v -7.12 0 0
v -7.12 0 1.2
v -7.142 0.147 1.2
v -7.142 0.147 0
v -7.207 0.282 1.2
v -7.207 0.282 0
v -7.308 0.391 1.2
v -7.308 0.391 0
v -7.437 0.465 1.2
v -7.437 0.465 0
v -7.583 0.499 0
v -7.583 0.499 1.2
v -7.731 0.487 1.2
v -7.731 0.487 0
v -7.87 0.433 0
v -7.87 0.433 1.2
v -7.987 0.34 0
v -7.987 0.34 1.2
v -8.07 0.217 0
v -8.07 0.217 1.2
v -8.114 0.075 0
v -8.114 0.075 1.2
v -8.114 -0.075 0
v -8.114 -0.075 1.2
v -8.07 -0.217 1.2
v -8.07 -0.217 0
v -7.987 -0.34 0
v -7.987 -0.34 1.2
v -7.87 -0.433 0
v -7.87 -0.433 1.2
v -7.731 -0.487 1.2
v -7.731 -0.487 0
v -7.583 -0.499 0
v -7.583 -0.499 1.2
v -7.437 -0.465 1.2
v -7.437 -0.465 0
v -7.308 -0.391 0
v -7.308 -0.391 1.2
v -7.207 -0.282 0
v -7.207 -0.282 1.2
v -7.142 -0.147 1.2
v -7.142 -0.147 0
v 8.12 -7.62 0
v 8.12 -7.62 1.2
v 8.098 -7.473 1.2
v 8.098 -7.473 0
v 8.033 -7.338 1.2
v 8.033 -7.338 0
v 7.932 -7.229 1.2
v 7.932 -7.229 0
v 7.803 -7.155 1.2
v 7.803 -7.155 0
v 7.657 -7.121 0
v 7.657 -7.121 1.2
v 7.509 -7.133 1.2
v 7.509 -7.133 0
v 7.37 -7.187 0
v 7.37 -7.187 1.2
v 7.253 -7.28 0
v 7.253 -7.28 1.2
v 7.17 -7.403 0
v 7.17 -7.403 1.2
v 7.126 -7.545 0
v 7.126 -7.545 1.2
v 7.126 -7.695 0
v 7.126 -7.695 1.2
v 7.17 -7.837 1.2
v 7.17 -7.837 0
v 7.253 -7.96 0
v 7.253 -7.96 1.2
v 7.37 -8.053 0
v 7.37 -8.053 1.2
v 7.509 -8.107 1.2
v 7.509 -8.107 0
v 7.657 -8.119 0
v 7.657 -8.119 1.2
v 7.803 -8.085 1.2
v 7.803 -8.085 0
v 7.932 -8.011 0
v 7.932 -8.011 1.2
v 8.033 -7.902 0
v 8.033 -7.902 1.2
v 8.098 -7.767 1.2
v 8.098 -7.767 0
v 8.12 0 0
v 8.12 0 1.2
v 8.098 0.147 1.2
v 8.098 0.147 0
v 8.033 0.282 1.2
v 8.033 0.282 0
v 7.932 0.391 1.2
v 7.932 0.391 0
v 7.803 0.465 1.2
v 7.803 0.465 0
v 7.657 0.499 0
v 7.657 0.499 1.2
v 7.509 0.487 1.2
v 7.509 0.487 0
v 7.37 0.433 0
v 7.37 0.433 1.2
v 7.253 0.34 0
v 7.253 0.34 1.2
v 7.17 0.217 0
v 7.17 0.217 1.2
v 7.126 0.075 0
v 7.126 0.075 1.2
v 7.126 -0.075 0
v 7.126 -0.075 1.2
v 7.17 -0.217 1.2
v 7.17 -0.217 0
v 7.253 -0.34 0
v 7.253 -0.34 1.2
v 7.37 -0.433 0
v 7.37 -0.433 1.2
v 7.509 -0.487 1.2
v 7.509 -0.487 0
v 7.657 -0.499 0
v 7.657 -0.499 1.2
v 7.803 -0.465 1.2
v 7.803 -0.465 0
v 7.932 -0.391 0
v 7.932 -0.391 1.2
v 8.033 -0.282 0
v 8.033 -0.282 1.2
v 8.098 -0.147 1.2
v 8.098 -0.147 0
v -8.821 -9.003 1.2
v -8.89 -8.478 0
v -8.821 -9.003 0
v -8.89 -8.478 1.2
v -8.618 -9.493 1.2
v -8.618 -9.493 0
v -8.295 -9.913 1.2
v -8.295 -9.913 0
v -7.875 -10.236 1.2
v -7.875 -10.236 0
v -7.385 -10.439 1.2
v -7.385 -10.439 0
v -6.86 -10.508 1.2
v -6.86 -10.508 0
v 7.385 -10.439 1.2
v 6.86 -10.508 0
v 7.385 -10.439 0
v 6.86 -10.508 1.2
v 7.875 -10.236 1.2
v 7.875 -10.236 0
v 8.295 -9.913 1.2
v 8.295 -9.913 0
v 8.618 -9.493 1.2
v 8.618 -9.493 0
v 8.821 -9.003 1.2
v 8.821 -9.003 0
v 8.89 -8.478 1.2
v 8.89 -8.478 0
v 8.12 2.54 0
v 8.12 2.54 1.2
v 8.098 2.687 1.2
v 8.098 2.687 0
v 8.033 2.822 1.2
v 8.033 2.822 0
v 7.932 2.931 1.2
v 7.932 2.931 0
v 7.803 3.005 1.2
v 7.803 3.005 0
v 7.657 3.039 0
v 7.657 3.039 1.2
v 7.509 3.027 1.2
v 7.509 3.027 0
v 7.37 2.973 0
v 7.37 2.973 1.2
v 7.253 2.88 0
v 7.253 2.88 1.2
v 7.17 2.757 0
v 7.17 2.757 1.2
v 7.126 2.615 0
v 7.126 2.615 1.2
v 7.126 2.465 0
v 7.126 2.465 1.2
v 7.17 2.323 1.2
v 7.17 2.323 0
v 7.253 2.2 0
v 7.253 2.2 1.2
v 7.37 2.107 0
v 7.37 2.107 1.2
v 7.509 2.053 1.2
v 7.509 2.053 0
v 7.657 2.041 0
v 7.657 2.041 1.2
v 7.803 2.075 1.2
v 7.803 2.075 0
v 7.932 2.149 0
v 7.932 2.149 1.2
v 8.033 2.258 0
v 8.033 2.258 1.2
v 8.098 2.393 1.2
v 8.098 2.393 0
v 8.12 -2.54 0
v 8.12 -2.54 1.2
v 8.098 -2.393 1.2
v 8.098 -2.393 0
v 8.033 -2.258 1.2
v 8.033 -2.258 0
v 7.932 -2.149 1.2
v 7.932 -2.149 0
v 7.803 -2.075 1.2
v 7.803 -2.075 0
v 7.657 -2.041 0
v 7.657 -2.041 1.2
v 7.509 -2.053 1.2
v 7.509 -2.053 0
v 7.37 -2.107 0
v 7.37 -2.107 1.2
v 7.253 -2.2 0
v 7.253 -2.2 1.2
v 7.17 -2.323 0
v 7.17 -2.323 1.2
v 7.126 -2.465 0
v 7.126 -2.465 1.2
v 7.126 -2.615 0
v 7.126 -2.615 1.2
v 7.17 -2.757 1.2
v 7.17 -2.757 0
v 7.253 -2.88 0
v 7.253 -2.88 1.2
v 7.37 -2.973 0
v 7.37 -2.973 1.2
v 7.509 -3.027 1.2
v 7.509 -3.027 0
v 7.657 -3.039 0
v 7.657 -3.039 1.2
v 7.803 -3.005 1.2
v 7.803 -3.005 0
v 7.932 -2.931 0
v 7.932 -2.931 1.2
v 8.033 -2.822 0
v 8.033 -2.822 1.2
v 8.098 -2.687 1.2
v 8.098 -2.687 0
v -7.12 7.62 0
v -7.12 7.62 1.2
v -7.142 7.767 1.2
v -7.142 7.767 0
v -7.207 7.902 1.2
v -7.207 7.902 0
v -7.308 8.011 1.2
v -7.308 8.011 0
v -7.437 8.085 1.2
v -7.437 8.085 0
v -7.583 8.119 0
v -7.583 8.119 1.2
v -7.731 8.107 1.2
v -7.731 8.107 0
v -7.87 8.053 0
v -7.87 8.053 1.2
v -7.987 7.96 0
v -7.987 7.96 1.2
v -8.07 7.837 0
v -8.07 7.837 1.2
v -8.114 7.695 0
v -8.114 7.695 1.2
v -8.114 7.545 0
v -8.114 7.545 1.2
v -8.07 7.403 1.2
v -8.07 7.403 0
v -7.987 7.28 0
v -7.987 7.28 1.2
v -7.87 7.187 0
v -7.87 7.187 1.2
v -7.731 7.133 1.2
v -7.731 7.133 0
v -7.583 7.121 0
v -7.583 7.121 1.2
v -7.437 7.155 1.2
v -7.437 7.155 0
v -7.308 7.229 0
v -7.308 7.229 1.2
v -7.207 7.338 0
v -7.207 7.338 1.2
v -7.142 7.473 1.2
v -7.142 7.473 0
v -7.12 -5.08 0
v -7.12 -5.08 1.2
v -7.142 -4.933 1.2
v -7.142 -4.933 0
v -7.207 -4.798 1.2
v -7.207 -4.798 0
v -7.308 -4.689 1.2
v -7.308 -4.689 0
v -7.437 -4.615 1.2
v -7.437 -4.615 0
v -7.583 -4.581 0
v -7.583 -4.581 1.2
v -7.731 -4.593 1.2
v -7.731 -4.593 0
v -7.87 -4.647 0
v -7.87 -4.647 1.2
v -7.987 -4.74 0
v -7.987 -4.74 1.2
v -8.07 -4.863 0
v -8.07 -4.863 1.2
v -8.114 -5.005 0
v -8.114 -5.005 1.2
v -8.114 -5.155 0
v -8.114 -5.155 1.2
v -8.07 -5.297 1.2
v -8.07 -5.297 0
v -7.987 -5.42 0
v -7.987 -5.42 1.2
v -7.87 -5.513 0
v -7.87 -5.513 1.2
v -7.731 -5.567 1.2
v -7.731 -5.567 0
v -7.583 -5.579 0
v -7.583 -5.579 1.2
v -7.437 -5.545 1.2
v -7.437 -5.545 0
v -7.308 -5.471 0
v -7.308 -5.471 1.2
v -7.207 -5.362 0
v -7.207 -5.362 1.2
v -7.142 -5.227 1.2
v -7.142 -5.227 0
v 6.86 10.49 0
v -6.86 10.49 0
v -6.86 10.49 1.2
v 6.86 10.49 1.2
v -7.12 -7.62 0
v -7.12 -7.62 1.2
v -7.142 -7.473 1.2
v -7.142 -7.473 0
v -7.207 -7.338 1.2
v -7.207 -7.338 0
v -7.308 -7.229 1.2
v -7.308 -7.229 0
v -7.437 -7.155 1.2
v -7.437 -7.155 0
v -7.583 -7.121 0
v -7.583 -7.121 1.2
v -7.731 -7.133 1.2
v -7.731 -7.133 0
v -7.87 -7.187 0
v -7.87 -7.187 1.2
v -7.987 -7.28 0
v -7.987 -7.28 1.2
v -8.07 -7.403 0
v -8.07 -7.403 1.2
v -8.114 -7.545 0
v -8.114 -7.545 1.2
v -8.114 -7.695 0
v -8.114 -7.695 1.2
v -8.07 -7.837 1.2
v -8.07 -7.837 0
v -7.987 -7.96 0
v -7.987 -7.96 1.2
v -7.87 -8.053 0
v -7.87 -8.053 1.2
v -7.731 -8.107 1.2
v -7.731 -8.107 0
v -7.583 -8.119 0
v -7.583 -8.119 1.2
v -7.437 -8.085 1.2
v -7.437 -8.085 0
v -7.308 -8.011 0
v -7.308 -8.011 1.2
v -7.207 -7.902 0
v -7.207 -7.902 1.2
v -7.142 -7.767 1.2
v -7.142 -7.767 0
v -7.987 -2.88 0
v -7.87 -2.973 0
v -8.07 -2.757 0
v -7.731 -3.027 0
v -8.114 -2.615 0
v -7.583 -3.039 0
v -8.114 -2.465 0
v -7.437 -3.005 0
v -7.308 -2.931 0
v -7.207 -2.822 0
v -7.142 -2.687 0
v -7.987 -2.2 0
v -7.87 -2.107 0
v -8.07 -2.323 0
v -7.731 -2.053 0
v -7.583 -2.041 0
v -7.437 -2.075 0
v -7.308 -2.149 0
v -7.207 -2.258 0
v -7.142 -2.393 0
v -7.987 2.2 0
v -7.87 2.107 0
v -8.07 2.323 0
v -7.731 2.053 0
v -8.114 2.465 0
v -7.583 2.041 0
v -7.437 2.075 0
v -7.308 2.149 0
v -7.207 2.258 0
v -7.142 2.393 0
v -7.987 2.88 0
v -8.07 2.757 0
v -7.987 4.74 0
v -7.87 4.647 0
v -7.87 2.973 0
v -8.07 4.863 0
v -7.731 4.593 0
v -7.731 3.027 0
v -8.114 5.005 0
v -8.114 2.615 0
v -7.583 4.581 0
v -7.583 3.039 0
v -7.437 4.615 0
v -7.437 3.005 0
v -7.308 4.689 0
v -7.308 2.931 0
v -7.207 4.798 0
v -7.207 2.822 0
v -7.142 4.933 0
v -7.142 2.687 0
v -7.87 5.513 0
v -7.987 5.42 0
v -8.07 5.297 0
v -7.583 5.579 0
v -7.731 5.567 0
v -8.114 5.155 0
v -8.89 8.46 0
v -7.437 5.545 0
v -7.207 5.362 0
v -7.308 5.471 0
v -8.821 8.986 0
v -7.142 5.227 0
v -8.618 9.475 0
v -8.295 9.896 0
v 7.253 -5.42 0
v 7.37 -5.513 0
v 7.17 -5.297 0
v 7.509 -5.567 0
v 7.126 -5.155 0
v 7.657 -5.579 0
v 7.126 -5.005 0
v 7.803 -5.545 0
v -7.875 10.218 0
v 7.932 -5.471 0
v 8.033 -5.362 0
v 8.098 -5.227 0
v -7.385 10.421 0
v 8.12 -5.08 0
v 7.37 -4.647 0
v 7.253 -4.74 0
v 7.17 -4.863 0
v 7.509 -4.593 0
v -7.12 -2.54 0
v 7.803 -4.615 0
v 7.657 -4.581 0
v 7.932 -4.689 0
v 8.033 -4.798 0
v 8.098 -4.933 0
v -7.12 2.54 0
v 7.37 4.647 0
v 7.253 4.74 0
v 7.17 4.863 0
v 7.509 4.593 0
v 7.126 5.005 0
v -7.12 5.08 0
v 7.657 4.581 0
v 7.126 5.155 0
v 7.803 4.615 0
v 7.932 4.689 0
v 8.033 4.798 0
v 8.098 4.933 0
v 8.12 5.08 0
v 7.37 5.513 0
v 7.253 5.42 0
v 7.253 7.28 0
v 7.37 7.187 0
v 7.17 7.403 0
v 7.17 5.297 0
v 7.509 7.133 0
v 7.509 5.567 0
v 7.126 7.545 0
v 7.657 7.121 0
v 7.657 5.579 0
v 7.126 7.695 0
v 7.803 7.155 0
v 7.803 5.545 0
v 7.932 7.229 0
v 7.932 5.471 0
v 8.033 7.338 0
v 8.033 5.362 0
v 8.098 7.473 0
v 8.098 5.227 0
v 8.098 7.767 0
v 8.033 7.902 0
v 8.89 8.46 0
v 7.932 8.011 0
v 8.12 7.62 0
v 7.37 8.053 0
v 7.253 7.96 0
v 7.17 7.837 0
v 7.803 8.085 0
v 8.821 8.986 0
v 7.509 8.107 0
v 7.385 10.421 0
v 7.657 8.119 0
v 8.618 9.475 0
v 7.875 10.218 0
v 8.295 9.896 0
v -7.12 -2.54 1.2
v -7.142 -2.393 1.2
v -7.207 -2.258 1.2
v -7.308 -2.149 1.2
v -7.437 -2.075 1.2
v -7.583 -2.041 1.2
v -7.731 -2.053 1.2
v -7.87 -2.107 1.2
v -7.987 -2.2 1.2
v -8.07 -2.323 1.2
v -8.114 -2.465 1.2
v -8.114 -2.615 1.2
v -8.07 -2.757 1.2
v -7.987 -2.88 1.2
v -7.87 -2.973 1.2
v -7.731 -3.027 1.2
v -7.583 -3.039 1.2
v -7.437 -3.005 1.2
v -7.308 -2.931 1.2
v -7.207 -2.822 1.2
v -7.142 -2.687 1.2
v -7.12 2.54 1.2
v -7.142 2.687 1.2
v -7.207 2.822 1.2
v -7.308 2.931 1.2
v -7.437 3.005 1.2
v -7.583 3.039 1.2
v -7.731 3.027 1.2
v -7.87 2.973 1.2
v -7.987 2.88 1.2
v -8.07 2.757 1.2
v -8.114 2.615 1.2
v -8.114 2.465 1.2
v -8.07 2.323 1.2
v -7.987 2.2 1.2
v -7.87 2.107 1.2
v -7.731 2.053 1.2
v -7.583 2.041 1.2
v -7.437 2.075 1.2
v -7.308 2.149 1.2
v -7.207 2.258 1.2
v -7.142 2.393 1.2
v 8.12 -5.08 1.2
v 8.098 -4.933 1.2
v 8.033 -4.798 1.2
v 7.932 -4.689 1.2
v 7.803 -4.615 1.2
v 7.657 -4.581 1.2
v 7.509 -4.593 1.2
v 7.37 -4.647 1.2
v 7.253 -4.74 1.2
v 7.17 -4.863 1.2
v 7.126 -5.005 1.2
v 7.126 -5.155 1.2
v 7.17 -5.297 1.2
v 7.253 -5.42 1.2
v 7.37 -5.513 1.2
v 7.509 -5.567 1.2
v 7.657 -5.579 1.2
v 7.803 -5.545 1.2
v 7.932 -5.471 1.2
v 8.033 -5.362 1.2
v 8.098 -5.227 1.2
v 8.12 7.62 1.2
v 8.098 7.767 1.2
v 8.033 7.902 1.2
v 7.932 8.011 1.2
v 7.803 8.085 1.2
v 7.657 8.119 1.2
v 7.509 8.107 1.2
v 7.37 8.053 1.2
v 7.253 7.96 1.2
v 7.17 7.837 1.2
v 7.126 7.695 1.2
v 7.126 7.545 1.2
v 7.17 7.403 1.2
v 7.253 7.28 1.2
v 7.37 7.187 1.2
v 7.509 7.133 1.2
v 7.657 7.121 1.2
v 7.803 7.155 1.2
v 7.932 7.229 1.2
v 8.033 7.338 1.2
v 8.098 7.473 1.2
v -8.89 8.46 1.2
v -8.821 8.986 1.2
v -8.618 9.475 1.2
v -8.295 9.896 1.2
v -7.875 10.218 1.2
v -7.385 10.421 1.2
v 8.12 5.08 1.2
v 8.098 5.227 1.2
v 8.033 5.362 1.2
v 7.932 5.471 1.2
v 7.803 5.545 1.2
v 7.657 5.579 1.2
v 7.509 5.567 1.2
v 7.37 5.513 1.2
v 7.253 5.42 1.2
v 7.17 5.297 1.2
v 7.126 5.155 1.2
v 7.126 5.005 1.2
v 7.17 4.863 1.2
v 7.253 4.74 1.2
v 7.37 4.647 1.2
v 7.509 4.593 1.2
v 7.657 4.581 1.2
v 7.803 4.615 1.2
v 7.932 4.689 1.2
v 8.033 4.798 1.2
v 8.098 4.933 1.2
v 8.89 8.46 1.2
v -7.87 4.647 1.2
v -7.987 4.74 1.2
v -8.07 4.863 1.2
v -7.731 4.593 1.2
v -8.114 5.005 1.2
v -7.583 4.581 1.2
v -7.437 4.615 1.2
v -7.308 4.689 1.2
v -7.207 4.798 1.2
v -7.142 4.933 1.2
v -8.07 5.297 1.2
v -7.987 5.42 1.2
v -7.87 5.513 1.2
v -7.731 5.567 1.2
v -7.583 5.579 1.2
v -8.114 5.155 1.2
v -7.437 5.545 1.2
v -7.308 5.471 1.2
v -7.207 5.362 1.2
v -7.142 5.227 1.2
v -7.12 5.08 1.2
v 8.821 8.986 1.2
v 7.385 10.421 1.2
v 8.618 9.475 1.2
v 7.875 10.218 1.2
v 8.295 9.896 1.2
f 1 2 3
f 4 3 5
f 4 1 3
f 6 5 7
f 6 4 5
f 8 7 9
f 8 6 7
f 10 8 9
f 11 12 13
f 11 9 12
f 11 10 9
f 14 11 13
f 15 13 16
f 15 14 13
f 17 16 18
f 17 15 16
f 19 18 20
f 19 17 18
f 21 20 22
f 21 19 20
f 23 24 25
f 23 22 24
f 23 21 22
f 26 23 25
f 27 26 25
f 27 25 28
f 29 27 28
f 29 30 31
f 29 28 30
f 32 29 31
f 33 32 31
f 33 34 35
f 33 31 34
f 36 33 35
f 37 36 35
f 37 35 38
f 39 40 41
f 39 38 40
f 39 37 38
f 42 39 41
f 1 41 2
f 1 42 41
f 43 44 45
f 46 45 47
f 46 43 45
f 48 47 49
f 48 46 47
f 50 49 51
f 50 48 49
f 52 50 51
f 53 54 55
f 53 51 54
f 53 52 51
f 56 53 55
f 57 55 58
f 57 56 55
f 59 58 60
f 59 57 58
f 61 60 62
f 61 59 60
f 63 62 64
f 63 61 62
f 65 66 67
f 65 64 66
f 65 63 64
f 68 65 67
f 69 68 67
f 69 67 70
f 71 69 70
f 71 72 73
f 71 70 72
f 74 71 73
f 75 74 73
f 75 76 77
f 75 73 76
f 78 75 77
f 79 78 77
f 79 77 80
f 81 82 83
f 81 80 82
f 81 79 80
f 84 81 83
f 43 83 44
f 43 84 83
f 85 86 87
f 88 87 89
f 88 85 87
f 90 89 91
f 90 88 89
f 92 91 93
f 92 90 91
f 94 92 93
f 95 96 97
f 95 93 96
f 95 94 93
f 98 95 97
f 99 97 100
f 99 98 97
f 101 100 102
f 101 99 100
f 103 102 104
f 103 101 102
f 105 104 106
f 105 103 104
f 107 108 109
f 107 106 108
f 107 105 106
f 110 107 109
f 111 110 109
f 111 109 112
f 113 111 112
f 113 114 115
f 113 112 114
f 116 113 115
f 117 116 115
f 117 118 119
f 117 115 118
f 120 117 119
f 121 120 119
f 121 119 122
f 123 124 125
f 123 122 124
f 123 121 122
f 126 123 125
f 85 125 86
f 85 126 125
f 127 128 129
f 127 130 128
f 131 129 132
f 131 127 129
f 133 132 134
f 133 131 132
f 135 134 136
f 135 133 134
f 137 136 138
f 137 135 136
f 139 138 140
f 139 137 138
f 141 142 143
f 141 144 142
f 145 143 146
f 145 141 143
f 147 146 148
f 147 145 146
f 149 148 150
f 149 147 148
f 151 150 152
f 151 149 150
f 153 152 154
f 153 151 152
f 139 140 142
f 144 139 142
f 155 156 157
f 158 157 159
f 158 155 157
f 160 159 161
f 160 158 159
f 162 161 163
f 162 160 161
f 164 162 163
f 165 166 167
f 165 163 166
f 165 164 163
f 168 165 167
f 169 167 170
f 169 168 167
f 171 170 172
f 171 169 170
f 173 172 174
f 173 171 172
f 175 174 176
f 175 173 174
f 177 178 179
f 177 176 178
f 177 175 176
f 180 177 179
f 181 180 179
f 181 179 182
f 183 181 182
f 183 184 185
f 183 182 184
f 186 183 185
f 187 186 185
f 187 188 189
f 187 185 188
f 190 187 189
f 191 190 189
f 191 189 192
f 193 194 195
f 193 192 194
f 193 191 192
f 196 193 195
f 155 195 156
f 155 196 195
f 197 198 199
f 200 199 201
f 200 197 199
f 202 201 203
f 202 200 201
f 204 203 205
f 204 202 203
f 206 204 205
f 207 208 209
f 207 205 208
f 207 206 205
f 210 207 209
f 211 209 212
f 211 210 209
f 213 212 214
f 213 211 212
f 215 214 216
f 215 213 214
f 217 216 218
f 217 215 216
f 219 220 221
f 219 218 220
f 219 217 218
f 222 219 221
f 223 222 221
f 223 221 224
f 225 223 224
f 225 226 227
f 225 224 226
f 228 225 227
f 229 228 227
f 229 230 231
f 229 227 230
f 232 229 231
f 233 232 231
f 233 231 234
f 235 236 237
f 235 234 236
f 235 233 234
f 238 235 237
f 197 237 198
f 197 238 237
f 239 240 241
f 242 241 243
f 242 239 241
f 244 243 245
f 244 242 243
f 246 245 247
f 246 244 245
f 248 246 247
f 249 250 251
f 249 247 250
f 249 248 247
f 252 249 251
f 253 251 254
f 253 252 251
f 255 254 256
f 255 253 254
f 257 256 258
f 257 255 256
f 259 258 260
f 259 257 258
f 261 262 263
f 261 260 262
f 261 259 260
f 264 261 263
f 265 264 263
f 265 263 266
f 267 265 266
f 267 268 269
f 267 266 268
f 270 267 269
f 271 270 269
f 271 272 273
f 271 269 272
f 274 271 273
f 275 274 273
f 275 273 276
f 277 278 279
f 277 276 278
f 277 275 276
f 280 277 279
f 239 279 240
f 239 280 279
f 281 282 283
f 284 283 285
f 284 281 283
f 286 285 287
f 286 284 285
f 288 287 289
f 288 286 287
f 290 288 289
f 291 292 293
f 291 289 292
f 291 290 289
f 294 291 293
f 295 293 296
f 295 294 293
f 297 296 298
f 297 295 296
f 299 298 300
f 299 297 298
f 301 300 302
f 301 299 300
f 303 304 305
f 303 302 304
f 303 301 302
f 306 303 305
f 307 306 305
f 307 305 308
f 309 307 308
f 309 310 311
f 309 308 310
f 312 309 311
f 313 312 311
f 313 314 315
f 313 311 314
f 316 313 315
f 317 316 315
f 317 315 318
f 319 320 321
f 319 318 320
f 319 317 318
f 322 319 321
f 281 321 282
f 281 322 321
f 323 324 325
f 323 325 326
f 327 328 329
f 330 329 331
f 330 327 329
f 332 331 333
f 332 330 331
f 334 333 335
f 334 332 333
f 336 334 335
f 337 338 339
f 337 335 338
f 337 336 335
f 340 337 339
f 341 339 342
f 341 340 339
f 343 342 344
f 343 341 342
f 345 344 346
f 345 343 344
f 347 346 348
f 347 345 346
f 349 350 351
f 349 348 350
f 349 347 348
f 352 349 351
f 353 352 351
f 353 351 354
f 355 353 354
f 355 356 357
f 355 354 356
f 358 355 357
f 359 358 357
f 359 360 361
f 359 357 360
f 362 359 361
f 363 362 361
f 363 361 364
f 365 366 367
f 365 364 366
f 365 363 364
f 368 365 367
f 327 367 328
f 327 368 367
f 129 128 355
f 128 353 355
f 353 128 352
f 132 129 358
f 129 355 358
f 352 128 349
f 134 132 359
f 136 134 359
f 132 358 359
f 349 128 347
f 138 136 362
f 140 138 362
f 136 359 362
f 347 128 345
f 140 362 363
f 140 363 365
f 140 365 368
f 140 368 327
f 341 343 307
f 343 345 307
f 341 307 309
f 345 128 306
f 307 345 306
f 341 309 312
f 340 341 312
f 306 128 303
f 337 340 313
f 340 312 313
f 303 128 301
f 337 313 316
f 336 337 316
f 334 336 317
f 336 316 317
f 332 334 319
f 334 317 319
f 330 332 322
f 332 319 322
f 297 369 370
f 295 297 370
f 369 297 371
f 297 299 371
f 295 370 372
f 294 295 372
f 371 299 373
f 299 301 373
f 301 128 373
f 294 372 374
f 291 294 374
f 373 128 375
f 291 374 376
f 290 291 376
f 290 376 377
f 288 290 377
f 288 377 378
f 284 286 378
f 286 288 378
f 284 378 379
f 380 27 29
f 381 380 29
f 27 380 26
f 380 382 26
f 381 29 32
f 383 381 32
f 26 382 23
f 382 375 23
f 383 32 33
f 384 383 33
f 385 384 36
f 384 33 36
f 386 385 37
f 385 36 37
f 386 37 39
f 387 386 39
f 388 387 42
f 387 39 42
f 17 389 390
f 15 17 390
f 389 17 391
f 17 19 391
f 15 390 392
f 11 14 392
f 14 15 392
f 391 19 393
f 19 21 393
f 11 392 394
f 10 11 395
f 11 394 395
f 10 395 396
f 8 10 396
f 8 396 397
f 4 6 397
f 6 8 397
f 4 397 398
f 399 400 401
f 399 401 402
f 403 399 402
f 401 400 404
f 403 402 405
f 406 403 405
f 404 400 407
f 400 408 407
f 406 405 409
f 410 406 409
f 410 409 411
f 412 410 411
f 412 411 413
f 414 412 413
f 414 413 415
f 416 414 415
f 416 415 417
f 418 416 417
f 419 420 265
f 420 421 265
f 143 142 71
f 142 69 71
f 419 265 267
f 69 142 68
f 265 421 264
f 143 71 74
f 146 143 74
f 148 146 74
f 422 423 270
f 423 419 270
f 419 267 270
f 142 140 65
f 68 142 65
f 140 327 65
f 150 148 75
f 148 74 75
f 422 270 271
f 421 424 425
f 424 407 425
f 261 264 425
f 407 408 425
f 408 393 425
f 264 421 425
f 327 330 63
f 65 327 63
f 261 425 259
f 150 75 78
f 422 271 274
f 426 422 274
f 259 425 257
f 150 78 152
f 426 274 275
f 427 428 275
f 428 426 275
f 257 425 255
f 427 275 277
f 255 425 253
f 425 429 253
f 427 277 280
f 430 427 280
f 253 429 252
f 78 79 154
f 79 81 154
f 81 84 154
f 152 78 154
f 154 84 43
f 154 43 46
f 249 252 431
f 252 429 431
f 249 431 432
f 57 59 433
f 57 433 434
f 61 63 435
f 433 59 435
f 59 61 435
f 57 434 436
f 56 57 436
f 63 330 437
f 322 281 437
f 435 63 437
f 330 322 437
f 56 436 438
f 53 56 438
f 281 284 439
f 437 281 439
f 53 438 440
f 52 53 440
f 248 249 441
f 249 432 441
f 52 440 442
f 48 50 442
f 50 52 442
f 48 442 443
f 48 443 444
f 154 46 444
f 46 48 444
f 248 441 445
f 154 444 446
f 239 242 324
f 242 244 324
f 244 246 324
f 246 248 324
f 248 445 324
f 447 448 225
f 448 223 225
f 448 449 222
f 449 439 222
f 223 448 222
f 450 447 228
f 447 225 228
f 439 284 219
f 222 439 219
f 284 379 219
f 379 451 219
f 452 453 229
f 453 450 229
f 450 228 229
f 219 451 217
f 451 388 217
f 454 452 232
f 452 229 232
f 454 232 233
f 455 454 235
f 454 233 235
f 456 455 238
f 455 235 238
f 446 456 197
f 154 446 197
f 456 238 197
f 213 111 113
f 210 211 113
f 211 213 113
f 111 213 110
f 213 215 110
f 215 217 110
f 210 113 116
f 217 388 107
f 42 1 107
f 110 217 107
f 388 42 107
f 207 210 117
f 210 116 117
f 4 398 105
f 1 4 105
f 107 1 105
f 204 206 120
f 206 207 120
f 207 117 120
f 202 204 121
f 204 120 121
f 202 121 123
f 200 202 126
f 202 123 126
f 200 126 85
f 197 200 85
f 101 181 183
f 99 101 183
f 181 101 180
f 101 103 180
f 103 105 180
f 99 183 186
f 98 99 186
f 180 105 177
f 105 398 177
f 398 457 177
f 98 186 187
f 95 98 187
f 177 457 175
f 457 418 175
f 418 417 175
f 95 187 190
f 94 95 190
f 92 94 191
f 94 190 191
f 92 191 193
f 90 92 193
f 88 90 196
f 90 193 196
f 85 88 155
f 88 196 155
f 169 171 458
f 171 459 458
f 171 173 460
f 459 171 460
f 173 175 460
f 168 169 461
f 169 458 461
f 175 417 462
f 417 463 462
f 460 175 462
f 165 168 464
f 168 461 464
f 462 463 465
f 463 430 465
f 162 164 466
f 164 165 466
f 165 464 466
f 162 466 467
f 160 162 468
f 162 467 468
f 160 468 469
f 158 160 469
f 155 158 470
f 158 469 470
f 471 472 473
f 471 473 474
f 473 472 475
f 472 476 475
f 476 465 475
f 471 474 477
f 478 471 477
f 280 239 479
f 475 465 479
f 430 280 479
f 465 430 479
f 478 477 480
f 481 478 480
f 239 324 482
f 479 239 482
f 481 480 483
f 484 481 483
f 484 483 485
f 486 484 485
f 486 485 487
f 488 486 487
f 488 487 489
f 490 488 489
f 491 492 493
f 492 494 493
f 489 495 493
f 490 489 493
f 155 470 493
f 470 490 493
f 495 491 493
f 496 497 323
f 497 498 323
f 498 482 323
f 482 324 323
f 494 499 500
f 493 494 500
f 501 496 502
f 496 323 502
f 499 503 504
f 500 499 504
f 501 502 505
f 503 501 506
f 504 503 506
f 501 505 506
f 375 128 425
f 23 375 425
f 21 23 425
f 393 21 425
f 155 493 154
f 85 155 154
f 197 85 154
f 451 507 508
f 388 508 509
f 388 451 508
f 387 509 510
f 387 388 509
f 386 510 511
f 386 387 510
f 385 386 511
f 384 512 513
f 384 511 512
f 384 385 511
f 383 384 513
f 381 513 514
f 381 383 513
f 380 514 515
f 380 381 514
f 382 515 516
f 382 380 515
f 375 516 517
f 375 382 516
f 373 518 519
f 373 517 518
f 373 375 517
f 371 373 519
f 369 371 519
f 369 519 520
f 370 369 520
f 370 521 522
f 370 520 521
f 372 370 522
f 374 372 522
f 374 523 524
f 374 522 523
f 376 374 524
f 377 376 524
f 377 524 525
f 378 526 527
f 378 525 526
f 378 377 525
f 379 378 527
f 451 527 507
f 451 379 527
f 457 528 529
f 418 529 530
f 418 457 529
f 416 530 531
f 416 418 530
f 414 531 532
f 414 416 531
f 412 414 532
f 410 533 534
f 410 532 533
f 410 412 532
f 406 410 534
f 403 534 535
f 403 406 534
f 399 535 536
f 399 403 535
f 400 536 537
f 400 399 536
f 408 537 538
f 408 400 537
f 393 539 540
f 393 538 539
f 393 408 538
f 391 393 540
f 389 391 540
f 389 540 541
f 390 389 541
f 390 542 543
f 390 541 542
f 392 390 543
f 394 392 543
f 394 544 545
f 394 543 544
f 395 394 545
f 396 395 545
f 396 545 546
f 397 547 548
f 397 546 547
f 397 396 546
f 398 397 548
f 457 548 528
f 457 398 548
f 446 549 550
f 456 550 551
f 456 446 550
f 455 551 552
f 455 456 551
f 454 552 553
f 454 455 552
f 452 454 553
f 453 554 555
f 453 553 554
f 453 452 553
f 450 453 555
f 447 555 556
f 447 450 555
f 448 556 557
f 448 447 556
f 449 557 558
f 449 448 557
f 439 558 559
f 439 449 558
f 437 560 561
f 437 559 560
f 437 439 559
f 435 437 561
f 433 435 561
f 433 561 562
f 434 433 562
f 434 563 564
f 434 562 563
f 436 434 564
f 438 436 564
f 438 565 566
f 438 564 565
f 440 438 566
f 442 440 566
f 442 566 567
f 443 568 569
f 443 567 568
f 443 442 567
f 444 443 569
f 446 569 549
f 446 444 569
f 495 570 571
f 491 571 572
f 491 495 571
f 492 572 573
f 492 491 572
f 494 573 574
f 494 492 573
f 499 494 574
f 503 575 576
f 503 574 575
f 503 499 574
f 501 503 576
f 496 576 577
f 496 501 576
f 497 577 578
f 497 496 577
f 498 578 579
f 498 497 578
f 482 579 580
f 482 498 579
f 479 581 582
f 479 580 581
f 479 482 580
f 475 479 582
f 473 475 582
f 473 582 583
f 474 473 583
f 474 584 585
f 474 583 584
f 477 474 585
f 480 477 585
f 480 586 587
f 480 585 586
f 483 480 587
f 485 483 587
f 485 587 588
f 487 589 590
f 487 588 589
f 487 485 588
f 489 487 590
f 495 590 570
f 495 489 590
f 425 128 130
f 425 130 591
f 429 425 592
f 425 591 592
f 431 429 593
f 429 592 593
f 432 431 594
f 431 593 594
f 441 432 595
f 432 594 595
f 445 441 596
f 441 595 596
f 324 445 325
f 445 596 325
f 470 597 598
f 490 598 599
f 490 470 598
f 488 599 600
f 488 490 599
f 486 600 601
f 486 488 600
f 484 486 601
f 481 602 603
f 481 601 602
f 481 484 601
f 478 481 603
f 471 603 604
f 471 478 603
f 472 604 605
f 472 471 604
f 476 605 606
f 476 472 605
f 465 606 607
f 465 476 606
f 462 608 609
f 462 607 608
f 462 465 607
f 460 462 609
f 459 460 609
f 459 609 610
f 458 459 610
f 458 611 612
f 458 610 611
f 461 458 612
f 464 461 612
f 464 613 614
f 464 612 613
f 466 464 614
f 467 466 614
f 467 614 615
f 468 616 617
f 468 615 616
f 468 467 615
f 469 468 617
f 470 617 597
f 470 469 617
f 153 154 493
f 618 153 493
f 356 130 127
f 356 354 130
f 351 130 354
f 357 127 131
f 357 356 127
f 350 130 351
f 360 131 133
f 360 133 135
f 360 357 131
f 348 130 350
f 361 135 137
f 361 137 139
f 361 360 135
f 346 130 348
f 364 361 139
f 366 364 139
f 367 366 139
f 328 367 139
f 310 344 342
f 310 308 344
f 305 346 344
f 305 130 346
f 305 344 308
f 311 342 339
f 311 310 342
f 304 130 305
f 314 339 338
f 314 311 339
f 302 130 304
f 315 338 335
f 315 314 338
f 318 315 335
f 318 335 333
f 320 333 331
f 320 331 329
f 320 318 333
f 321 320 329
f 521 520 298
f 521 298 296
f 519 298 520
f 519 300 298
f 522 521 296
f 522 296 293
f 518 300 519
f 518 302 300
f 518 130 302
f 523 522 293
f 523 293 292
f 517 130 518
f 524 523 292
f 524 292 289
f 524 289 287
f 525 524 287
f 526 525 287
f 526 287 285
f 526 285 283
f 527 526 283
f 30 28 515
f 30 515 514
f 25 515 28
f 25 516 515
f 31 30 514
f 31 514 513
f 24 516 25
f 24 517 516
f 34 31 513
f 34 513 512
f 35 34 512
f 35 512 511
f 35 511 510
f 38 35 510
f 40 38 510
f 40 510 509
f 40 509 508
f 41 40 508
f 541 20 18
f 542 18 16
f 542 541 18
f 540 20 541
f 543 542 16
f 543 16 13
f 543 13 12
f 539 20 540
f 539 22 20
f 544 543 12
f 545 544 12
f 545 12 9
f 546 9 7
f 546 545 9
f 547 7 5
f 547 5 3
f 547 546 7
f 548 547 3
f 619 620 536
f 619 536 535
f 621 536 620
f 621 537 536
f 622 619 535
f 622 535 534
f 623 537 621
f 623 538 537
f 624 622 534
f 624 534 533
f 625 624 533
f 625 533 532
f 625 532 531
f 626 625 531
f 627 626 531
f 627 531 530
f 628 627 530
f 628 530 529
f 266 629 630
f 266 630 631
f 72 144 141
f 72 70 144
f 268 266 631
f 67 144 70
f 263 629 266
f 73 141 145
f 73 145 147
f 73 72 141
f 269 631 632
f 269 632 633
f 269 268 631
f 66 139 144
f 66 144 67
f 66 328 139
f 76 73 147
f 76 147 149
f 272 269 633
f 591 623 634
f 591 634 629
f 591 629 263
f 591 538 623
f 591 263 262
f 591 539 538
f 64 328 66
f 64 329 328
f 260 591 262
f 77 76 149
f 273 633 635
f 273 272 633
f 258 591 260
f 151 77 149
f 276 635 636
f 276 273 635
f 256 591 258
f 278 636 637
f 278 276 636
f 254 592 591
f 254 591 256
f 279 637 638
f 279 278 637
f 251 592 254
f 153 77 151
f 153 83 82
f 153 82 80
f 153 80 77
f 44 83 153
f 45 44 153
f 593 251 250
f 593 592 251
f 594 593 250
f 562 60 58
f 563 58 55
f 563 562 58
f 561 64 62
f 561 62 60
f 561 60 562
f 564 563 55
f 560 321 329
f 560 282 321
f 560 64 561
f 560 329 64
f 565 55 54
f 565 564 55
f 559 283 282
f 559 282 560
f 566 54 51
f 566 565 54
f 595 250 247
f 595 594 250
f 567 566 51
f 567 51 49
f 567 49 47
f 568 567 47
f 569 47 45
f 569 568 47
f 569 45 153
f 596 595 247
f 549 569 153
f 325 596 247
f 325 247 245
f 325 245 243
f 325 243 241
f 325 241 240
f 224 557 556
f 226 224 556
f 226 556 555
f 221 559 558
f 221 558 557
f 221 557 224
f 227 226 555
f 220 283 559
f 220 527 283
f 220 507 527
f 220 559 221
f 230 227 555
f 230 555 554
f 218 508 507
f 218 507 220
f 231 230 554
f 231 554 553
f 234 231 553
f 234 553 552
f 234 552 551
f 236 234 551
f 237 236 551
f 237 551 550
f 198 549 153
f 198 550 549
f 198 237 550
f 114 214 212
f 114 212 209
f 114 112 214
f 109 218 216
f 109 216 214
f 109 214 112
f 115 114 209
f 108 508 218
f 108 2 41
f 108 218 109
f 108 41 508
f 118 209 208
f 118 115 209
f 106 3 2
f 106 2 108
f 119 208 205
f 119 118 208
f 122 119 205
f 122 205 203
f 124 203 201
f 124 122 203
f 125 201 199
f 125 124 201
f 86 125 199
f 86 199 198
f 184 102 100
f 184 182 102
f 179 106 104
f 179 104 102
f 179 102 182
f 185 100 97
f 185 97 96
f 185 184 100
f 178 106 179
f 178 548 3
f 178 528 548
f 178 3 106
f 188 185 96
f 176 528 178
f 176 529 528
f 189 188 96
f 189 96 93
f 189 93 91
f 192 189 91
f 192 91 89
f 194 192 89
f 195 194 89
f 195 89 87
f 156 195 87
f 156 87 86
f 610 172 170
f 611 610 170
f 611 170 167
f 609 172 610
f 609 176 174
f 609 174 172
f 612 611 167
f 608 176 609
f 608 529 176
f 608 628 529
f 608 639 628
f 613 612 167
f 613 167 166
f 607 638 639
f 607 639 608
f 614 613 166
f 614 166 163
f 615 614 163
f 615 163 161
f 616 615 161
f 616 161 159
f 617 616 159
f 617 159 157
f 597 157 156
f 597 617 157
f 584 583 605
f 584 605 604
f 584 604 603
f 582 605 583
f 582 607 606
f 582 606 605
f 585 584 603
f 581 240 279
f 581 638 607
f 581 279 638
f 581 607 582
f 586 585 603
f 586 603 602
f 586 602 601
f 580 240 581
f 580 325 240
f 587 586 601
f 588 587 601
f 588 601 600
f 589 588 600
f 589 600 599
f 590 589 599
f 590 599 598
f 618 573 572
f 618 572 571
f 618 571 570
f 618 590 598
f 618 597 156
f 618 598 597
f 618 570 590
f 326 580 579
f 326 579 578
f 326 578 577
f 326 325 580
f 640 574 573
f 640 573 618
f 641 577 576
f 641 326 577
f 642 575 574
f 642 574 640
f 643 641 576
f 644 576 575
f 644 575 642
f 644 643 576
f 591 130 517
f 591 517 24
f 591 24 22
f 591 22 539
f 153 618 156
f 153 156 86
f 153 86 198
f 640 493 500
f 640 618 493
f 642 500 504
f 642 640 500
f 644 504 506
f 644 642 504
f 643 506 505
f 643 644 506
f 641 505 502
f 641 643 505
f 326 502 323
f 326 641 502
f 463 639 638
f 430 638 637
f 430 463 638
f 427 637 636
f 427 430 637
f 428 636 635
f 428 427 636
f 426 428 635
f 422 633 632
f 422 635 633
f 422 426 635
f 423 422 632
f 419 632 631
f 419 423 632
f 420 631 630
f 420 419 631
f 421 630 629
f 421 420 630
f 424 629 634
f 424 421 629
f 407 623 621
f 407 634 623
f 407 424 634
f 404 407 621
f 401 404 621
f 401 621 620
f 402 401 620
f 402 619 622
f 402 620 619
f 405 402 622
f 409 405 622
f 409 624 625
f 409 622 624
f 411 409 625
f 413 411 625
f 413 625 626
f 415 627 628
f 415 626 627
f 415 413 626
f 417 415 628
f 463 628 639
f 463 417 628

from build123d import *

# Parameters (mm, degrees)
CYLINDER010_R     = 0.5
CYLINDER010_DEPTH = 2
ARRAY_X_COUNT     = 2
ARRAY_X_PITCH     = 15.24
ARRAY_Y_COUNT     = 7
ARRAY_Y_PITCH     = 2.54
BOX028_W          = 17.78
BOX028_H          = 20.9982
BOX028_DEPTH      = 1.2
FILLET009_R       = 2.03


with BuildPart() as xiao_th_all:
    # Cylinder010 → Cylinder010 (new body)
    with BuildSketch(Plane(origin=(-7.62, -7.62, 0), x_dir=(1, 0, 0), z_dir=(0, 0, 1))):
        Circle(CYLINDER010_R)
    extrude(amount=CYLINDER010_DEPTH)

    # Array X: XIAO_TH_All ×2


with BuildPart() as xiao_th_all_1:
    add(xiao_th_all.part)
    with Locations(*[(i * ARRAY_X_PITCH, 0, 0) for i in range(1, ARRAY_X_COUNT)]):
        add(xiao_th_all.part)

    # Array Y: XIAO_TH_All ×7


with BuildPart() as xiao_th_all_2:
    add(xiao_th_all_1.part)
    with Locations(*[(0, i * ARRAY_Y_PITCH, 0) for i in range(1, ARRAY_Y_COUNT)]):
        add(xiao_th_all_1.part)


with BuildPart() as xiao_base3:
    # Box028 → Box028 (new body)
    with BuildSketch(Plane(origin=(-8.89, -10.508, 0), x_dir=(1, 0, 0), z_dir=(0, 0, 1))):
        with Locations((8.89, 10.4991)):
            Rectangle(BOX028_W, BOX028_H)
    extrude(amount=BOX028_DEPTH)

    # Fillet009
    fillet009_edges = [xiao_base3.edges().sort_by_distance(p)[0] for p in [
        (-8.89, -10.508, 0.6),
        (-8.89, 10.4902, 0.6),
        (8.89, -10.508, 0.6),
        (8.89, 10.4902, 0.6),
    ]]
    fillet(fillet009_edges, radius=FILLET009_R)

    # Cut004: cut XIAO_TH_All
    add(xiao_th_all_2.part, mode=Mode.SUBTRACT)


solid = xiao_base3.part
